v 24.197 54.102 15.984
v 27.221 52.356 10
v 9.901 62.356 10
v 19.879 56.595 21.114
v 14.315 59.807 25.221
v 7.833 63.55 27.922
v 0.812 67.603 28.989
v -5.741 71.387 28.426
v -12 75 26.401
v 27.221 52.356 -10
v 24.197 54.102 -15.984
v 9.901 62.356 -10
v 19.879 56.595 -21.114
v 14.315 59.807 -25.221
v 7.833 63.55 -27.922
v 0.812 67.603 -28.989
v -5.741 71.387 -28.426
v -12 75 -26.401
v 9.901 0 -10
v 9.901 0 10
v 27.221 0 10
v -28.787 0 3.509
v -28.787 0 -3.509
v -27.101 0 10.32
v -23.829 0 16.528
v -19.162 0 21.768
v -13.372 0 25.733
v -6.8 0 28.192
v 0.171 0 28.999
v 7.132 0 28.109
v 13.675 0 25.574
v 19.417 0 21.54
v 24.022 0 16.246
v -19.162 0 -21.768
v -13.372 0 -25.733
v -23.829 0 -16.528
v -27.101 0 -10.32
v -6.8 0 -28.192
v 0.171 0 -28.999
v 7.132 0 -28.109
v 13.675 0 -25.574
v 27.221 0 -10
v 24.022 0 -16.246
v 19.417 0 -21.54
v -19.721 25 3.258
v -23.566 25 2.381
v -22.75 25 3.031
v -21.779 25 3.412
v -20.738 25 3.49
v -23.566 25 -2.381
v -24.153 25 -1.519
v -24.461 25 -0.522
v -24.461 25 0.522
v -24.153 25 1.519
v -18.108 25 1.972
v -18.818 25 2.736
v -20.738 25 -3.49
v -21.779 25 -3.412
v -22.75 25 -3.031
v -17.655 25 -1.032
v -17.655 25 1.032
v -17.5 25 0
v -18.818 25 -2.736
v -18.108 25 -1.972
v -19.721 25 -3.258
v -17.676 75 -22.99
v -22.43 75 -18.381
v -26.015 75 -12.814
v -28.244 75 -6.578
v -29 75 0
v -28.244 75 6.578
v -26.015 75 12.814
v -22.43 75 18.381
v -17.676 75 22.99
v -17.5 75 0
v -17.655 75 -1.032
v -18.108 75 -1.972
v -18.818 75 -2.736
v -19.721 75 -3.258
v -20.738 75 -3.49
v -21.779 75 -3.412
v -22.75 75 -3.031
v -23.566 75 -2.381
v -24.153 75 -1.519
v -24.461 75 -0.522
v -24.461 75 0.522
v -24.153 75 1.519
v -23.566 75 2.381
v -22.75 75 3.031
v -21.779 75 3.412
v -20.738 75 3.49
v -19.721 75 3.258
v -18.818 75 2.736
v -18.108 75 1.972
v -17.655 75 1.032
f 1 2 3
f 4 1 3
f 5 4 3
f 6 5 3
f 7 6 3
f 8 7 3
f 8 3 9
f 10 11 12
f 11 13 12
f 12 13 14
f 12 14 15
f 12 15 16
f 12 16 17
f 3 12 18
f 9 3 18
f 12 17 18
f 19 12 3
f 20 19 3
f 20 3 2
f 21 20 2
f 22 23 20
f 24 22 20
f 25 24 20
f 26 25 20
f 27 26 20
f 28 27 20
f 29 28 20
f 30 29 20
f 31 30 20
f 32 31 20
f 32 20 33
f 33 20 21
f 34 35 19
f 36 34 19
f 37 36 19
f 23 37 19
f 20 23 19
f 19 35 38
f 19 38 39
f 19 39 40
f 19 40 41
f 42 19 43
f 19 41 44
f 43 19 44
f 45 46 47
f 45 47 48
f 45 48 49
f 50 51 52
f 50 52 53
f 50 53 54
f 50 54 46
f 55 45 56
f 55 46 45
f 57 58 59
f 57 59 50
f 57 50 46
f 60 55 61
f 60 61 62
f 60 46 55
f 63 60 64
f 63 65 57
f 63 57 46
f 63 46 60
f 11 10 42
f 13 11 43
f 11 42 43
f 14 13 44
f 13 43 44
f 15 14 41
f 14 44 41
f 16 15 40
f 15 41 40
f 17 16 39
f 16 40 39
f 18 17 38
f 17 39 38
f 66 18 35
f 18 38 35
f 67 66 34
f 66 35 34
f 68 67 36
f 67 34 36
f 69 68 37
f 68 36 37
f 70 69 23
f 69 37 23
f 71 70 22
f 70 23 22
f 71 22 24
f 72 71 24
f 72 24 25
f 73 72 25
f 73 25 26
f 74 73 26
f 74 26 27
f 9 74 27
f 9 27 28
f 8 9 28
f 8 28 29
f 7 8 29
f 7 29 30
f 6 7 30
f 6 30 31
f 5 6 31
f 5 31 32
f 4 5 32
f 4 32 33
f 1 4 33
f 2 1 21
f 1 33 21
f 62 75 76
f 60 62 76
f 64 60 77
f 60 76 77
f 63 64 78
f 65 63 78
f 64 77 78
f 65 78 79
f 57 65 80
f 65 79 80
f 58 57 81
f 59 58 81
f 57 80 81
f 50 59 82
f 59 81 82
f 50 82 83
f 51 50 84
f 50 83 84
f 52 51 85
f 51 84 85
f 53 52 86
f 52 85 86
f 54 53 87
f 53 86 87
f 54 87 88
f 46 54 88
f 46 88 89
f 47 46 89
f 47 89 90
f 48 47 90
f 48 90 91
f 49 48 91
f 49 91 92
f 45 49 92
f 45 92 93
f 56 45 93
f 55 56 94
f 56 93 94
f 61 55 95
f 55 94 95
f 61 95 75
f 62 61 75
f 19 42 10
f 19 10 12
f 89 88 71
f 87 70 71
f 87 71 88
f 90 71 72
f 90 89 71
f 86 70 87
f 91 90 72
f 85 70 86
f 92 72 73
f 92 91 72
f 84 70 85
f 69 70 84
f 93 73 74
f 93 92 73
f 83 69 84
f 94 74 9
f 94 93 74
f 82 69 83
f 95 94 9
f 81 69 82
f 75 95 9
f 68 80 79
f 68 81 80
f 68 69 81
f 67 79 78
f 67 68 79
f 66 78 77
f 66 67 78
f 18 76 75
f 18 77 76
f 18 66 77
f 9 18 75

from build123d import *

# Parameters (mm, degrees)
SKETCH1_R               = 29
BOSS_EXTRUDE1_DEPTH     = 75
SKETCH3_R               = 3.5
BOSS_EXTRUDE3_DEPTH     = 50
SKETCH3_4_R             = 3.5
CUT_EXTRUDE1_DEPTH      = 50
CUT_EXTRUDE2_DEPTH      = 30
CUT_EXTRUDE2_DEPTH_BACK = 30
CUT_EXTRUDE4_DEPTH      = 85.969655115


with BuildPart() as part:
    # Sketch1 → Boss-Extrude1 (new body)
    with BuildSketch(Plane(origin=(0, 0, 0), x_dir=(1, 0, 0), z_dir=(0, 1, 0))):
        Circle(SKETCH1_R)
    extrude(amount=BOSS_EXTRUDE1_DEPTH)

    # Sketch3 → Boss-Extrude3 (add)
    with BuildSketch(Plane(origin=(0, 75, 0), x_dir=(1, 0, 0), z_dir=(0, 1, 0))):
        with Locations((-21, 0)):
            Circle(SKETCH3_R)
    extrude(amount=-BOSS_EXTRUDE3_DEPTH)

    # Sketch3<4> → Cut-Extrude1 (cut)
    with BuildSketch(Plane(origin=(0, 75, 0), x_dir=(1, 0, 0), z_dir=(0, 1, 0))):
        with Locations((-21, 0)):
            Circle(SKETCH3_4_R)
    extrude(amount=-CUT_EXTRUDE1_DEPTH, mode=Mode.SUBTRACT)

    # Sketch9 → Cut-Extrude2 (cut, two sides)
    with BuildSketch(Plane.XY) as cut_extrude2_sk:
        Polygon((-12, 75), (29, 75), (29, 51.328638963), align=None)
    extrude(amount=CUT_EXTRUDE2_DEPTH, mode=Mode.SUBTRACT)
    extrude(cut_extrude2_sk.sketch, amount=-CUT_EXTRUDE2_DEPTH_BACK, mode=Mode.SUBTRACT)

    # Sketch18 → Cut-Extrude4 (cut, through all, along a direction that is not the sketch's normal)
    with BuildSketch(Plane(origin=(29.475952642, 51.053847577, 0), x_dir=(0.866025404, -0.5, 0), z_dir=(0.5, 0.866025404, 0))):
        with BuildLine():
            Line((-2.603431094, 10), (-22.603431094, 10))
            Line((-22.603431094, 10), (-22.603431094, -10))
            Line((-22.603431094, -10), (-2.603431094, -10))
            add(Edge.make_bspline(
                [(-2.603431094, -10), (1.638467326, 0), (-2.603431094, 10)],
                knots=[5.931130208, 5.931130208, 5.931130208, 6.635240406, 6.635240406, 6.635240406], degree=2, weights=[1, 0.938666041, 1]))
        make_face()
    extrude(amount=-CUT_EXTRUDE4_DEPTH, dir=(0, 1, 0), mode=Mode.SUBTRACT)


solid = part.part
